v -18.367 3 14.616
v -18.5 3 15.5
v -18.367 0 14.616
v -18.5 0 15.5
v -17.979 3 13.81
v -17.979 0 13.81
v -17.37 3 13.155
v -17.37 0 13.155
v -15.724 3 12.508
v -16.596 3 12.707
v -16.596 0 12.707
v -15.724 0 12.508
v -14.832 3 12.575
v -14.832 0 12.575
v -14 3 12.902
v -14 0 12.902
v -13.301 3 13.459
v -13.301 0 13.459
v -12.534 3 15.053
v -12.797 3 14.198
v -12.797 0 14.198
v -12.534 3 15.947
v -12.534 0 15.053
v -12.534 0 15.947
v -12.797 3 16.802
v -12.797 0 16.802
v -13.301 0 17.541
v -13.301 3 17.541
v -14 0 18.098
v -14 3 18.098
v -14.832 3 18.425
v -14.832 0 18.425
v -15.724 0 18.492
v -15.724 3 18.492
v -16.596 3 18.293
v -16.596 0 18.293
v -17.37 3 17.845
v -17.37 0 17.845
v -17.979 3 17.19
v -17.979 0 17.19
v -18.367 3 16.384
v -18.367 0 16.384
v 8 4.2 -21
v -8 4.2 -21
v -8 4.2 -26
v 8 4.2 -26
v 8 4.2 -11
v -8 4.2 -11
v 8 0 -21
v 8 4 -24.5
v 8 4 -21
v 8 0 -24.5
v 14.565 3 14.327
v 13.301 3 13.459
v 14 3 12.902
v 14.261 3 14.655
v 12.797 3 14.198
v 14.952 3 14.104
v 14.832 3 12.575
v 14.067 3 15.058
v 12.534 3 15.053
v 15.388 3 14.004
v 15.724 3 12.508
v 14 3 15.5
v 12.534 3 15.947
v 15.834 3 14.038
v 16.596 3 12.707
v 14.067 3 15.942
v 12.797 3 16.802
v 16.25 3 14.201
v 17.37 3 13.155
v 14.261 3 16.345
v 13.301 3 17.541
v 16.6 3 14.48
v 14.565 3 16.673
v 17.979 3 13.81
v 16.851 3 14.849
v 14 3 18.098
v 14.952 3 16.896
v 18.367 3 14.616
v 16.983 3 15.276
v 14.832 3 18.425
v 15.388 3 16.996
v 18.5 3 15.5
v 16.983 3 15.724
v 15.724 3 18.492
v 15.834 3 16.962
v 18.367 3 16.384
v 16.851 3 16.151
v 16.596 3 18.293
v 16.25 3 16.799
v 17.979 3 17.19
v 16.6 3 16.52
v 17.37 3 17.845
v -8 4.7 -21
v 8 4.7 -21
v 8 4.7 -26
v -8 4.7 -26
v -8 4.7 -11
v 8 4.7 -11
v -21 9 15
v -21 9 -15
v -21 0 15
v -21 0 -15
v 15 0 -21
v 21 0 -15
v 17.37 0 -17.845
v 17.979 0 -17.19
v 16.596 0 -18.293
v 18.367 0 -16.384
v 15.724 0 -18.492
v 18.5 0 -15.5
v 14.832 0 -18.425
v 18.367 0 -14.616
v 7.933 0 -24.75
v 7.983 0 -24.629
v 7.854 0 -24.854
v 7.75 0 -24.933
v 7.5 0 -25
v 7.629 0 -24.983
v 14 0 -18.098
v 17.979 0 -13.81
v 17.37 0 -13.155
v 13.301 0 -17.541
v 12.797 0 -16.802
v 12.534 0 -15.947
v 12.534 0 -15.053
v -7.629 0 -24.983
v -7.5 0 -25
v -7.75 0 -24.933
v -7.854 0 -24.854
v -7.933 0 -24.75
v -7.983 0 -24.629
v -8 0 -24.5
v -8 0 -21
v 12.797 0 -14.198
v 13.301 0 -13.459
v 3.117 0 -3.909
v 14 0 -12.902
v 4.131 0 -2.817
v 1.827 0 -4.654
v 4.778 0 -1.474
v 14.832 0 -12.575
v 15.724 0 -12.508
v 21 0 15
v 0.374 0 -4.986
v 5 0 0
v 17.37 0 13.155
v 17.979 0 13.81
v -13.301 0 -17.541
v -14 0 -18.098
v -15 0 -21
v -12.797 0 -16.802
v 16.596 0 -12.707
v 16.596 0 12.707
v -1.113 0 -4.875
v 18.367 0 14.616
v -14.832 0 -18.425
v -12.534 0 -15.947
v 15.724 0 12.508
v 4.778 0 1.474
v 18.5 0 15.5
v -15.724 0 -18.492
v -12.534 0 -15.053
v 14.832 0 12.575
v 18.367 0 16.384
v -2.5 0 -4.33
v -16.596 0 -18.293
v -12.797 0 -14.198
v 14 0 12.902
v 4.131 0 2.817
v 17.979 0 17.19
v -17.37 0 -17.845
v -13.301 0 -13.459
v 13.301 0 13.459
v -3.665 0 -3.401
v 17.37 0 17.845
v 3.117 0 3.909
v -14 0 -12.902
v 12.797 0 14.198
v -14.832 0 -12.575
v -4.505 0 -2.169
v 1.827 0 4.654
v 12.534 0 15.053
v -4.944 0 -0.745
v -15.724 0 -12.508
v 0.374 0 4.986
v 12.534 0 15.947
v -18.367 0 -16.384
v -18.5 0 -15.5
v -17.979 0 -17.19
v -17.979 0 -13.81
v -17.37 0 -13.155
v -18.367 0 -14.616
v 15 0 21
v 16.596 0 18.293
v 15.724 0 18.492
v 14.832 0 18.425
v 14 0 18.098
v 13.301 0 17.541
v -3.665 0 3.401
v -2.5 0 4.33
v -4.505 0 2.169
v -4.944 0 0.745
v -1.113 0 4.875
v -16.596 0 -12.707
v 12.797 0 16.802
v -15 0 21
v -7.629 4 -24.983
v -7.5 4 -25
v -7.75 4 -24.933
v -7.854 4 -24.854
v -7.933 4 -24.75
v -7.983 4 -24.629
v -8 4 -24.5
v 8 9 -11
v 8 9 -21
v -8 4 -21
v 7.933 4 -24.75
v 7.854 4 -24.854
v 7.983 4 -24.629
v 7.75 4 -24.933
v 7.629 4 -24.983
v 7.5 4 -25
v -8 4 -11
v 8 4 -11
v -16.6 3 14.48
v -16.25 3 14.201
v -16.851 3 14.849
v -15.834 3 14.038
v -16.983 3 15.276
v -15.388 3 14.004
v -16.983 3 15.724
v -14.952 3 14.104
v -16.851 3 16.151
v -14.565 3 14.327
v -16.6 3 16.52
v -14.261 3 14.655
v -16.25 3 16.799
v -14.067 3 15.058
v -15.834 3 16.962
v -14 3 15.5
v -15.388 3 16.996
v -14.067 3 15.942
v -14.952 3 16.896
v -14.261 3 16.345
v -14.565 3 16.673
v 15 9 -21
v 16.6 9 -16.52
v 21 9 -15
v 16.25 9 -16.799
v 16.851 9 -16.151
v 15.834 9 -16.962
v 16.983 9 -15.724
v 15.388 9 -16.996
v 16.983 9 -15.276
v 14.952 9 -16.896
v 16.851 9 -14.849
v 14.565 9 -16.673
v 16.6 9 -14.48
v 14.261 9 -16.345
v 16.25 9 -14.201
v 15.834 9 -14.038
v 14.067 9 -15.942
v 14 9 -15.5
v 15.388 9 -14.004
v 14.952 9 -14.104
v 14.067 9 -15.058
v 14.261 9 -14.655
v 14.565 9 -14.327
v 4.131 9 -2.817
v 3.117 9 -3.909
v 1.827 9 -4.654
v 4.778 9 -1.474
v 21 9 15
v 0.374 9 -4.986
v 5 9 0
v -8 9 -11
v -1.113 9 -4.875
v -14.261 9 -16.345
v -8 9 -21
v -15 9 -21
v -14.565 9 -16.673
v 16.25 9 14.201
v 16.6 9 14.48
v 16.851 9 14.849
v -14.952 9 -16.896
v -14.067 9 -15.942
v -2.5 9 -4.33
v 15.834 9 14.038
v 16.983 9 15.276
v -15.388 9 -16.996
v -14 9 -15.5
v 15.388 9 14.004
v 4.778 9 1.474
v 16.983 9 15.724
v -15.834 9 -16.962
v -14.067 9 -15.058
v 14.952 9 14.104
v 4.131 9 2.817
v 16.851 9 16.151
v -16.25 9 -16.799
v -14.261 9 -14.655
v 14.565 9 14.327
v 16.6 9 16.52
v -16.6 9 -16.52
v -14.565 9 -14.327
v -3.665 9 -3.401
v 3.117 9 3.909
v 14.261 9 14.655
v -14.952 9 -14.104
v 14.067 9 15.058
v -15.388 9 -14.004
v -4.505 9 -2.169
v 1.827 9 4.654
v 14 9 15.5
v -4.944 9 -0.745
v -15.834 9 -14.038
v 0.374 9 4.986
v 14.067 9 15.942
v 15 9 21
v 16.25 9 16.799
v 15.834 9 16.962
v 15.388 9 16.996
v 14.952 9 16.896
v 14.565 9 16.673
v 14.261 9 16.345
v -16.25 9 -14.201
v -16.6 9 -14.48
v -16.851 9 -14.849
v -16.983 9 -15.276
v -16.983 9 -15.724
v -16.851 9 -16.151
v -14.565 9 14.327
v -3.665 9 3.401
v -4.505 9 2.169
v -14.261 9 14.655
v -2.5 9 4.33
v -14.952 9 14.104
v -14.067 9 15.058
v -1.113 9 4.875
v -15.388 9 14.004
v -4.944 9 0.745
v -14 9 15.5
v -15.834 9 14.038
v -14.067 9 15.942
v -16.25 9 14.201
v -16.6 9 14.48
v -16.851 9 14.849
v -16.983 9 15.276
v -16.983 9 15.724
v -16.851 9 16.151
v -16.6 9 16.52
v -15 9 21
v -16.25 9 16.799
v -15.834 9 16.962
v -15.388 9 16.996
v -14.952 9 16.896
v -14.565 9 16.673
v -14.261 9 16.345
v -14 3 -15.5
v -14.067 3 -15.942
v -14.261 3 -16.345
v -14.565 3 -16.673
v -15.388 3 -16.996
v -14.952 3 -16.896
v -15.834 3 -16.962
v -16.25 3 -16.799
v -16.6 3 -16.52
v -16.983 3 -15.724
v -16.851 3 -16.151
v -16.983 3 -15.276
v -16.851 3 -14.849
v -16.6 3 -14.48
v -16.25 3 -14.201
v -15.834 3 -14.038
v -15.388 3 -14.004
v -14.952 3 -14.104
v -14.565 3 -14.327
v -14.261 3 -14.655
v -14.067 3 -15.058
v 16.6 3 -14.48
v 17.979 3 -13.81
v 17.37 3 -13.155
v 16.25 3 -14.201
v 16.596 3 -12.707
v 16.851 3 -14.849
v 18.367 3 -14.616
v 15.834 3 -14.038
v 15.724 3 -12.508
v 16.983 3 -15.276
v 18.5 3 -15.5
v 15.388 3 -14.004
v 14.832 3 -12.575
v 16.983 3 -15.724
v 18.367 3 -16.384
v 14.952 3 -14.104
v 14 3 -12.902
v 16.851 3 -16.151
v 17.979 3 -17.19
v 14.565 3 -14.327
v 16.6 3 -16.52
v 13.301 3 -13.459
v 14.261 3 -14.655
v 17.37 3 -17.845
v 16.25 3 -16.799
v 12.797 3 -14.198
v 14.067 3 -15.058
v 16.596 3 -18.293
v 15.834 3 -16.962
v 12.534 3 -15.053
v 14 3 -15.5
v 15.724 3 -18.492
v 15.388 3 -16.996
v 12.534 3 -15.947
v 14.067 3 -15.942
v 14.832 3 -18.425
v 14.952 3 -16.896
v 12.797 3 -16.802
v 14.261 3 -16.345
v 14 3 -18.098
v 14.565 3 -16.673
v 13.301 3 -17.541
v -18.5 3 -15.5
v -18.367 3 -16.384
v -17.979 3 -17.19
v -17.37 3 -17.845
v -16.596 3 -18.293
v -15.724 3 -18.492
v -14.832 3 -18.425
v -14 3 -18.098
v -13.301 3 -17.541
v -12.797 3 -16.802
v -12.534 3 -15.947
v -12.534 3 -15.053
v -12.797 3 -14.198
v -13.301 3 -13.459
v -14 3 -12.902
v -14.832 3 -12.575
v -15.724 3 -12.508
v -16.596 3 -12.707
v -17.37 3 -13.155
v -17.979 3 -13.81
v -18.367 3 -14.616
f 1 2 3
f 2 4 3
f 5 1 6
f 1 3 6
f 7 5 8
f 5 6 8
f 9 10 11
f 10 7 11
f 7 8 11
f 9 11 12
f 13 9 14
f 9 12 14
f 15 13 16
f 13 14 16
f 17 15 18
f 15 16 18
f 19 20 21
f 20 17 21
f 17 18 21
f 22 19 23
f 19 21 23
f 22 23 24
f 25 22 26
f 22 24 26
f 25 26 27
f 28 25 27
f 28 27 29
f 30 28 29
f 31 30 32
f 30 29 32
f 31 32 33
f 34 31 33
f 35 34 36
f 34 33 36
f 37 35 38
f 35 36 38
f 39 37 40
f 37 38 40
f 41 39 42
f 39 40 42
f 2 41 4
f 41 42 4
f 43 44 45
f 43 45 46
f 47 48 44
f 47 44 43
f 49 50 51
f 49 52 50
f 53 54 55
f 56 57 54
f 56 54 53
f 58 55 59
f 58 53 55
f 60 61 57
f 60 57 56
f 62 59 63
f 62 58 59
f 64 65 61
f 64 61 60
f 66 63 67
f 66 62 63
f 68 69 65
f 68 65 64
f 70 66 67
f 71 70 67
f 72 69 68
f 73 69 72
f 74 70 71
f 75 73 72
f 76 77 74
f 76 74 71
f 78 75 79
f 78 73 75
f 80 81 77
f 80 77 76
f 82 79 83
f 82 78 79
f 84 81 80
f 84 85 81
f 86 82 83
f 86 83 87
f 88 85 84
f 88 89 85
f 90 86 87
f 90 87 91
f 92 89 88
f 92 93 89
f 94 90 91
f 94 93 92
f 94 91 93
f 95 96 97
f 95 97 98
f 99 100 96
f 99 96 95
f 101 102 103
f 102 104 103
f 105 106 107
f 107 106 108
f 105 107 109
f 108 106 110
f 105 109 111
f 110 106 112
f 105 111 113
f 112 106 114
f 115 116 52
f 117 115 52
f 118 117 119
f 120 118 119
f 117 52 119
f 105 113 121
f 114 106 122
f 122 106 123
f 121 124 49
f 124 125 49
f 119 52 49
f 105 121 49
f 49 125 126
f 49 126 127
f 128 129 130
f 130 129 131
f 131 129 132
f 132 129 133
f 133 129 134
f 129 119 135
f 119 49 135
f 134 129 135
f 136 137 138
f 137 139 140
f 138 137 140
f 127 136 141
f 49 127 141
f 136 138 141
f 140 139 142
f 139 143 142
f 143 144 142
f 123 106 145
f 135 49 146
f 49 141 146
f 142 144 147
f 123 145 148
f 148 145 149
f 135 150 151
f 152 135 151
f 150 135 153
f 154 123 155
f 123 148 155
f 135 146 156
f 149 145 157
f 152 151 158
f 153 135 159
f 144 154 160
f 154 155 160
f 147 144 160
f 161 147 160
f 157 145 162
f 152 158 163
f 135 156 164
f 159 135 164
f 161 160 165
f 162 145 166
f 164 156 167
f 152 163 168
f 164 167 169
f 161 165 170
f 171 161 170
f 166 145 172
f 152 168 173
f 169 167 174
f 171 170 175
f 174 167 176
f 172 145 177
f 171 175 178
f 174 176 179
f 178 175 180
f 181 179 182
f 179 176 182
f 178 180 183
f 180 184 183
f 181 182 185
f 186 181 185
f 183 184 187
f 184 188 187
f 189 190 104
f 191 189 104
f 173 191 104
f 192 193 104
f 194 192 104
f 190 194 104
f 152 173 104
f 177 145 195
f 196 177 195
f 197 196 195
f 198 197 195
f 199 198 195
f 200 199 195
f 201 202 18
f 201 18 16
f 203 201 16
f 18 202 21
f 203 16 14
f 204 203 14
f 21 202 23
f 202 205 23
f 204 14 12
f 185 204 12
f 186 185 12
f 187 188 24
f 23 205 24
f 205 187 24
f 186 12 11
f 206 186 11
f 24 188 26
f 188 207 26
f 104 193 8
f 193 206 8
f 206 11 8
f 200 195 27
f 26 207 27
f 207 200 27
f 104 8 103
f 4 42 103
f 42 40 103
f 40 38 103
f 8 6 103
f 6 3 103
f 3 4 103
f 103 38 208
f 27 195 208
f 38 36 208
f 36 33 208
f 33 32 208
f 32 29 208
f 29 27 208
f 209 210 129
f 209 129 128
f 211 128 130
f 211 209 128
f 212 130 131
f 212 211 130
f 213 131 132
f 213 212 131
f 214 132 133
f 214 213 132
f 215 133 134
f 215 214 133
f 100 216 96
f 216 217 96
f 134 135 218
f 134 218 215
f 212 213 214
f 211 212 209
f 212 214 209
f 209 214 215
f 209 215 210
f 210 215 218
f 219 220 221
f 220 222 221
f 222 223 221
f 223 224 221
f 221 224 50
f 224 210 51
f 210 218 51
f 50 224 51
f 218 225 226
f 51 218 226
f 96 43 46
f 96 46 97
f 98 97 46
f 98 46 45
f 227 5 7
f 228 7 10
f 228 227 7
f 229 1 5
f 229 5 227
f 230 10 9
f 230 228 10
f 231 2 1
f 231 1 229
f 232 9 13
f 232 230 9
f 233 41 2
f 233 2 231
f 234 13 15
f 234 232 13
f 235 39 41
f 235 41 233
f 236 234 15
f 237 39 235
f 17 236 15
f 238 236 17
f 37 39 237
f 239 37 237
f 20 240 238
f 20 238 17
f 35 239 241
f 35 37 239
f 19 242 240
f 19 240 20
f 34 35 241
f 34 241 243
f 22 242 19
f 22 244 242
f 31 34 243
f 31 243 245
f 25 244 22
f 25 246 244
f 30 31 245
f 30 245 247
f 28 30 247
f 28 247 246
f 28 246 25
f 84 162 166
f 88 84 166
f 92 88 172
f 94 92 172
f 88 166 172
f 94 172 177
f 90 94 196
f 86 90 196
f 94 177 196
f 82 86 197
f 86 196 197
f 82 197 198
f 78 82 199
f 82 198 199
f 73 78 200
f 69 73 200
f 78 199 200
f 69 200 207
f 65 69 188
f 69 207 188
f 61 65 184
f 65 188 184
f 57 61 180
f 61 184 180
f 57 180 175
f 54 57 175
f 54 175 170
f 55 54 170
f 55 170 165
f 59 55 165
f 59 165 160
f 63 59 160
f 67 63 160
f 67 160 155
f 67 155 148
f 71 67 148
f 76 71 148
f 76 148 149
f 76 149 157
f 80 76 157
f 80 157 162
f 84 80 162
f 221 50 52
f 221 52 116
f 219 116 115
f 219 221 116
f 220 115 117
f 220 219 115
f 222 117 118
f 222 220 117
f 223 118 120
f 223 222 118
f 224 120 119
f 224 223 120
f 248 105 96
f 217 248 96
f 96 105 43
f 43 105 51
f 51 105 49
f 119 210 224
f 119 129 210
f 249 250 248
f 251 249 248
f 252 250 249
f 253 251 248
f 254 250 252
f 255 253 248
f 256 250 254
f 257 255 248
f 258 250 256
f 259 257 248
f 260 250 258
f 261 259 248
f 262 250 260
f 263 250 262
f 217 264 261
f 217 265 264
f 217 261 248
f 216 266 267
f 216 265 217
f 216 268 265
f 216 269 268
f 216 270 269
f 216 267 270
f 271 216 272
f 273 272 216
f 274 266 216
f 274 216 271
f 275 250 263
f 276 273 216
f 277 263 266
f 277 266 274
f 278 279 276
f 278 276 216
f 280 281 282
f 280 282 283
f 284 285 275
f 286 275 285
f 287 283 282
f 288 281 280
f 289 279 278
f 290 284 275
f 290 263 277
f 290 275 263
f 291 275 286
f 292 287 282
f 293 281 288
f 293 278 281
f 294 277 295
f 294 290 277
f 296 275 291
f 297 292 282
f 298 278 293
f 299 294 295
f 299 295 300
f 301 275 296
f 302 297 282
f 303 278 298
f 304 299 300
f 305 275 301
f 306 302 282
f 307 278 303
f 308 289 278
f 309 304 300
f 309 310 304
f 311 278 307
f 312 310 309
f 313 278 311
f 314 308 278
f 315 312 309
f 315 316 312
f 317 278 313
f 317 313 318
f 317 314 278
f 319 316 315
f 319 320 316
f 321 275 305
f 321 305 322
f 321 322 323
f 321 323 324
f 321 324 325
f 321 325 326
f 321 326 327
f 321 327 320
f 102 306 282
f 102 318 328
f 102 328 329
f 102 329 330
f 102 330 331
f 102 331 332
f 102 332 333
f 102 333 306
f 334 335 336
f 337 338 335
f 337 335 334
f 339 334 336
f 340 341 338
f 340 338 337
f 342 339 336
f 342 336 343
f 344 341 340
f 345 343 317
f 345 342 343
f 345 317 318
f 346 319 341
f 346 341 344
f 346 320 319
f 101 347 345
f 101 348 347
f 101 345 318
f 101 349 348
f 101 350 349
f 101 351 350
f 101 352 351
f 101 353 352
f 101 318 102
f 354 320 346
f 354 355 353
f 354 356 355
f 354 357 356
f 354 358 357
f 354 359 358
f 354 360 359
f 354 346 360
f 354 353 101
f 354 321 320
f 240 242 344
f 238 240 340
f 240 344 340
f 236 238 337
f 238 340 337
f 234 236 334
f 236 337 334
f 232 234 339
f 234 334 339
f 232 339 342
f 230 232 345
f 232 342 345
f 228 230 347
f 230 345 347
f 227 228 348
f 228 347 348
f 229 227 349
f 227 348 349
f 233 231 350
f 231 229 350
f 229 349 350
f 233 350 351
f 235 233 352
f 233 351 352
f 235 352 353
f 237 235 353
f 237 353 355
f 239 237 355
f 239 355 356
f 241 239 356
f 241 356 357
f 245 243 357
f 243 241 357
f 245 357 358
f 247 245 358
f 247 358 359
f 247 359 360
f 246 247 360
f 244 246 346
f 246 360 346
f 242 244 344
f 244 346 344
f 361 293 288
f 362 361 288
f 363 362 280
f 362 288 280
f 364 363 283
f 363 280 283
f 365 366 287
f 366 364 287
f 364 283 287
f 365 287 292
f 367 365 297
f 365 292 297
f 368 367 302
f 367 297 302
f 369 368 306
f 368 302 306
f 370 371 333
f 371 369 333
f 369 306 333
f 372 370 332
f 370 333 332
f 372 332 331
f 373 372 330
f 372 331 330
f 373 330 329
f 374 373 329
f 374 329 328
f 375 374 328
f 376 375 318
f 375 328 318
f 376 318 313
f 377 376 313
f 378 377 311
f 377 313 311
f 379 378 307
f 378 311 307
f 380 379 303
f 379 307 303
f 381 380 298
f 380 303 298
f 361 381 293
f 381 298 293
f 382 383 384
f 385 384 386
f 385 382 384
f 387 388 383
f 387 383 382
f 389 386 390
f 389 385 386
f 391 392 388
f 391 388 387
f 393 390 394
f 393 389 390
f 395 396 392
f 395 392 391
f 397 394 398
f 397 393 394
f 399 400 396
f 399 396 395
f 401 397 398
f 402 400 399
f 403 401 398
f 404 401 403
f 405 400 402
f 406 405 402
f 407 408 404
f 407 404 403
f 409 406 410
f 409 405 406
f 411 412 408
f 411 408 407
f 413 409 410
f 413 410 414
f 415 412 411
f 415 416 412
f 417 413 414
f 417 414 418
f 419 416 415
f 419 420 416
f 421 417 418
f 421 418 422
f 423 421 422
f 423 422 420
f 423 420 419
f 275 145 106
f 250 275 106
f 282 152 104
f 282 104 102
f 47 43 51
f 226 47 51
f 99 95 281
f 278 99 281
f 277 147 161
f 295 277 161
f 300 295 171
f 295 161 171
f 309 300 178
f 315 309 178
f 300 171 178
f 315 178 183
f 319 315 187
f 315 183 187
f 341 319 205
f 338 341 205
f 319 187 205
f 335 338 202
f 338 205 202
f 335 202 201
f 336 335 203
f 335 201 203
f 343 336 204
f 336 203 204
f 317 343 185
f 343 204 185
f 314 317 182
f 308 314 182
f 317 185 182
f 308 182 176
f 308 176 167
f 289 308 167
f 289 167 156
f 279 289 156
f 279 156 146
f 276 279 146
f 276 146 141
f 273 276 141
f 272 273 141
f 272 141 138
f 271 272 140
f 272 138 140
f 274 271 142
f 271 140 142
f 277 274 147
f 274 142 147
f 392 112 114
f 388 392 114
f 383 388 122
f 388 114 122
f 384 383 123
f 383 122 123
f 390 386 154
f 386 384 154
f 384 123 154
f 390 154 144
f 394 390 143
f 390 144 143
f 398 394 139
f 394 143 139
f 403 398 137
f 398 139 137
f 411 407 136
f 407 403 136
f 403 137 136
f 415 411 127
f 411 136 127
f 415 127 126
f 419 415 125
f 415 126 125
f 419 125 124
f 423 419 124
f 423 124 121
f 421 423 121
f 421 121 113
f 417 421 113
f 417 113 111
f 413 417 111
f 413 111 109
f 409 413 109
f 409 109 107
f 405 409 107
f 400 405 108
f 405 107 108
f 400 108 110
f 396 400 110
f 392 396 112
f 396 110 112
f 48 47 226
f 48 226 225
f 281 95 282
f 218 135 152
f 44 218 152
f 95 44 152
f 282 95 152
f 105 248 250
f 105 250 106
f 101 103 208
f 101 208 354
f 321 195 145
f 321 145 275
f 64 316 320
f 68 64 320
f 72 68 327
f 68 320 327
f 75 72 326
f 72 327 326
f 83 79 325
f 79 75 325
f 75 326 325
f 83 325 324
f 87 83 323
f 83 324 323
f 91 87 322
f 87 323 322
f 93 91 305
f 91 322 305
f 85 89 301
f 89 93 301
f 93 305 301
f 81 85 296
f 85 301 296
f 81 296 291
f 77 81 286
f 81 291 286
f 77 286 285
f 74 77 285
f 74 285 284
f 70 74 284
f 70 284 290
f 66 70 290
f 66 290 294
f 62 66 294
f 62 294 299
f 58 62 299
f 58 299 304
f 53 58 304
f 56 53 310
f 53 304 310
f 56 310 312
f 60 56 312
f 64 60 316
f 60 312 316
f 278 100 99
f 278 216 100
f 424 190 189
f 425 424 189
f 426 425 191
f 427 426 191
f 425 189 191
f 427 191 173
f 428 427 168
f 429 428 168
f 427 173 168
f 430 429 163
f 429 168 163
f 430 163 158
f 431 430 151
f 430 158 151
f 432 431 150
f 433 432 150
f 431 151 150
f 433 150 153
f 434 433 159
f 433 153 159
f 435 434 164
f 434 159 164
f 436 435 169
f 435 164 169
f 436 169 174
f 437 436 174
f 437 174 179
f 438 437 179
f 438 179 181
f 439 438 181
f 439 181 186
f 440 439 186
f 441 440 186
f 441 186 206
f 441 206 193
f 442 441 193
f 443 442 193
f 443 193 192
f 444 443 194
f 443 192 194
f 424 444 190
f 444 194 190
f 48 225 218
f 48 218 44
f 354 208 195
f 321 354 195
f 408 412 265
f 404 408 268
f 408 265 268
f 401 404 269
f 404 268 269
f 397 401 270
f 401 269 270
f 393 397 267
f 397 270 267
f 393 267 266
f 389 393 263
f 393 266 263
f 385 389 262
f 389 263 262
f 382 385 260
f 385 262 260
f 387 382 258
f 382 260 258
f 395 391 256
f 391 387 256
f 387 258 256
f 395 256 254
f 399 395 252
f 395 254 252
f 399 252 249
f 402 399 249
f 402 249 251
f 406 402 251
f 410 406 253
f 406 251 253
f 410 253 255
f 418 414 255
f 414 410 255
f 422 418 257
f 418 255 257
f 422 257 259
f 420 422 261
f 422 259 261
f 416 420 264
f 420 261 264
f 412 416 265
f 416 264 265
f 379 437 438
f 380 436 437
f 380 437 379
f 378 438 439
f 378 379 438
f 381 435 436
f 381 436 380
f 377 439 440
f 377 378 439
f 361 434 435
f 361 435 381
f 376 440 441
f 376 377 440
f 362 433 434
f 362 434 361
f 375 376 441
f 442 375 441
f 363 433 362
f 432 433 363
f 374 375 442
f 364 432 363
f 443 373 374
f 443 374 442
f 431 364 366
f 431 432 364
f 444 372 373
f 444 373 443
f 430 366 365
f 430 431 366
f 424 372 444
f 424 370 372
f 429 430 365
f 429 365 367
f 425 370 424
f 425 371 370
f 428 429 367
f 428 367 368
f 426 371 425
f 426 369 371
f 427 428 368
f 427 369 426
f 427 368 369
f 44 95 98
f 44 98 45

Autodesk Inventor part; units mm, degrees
ref_plane "YZ Plane" through (0, 0, 0) normal (1, 0, 0) x (0, 1, 0)
ref_plane "XZ Plane" through (0, 0, 0) normal (0, 1, 0) x (-1, 0, 0)
ref_plane "XY Plane" through (0, 0, 0) normal (0, 0, 1) x (1, 0, 0)
sketch "Sketch1" plane through (0, 0, 0) normal (0, 1, 0) x (-1, 0, 0)
  line L0 (-21, -21) -> (21, -21)
  line L1 (21, -21) -> (21, 21)
  line L2 (21, 21) -> (-21, 21)
  line L3 (-21, 21) -> (-21, -21)
  line L4 (-21, -21) -> (21, 21) construction
  line L5 (21, -21) -> (-21, 21) construction
  point P0 (0, 0)
  dimension "d0" = 42
  dimension "d1" = 42
extrude "Extrusion1" add sketch "Sketch1" along normal blind 9
chamfer "Chamfer1" distance 6 angle 45 4 edges at (21, 4.5, -21) (-21, 4.5, -21) (-21, 4.5, 21) (21, 4.5, 21)
sketch "Sketch2" plane through (0, 9, 0) normal (0, 1, 0) x (1, 0, 0)
  point P0 (0, 0)
sketch "Sketch3" plane through (0, 0, 0) normal (0, -1, 0) x (1, 0, 0)
  circle A0 centre (0, 0) radius 5
  dimension "d7" = 10
extrude "Extrusion2" cut sketch "Sketch3" against normal up to surface (9 mm away)
sketch "Sketch4" plane through (0, 9, 0) normal (0, 1, 0) x (1, 0, 0)
  circle A0 centre (-15.5, -15.5) radius 1.5
  line L0 (-15, -21) -> (15, -21) projected
  line L1 (-21, 15) -> (-21, -15) projected
  point P0 (0, 0)
  dimension "d10" = 3
  dimension "d11" = 5.5
  dimension "d12" = 5.5
extrude "Extrusion3" cut sketch "Sketch4" against normal up to surface (9 mm away)
mirror "Mirror1" about plane through (0, 0, 0) normal (1, 0, 0) of "Extrusion3"
mirror "Mirror2" about plane through (0, 0, 0) normal (0, 0, 1) of "Extrusion3", "Mirror1"
sketch "Sketch6" plane through (0, 0, 0) normal (0, -1, 0) x (1, 0, 0)
  circle A0 centre (15.5, -15.5) radius 1.5 projected
  circle A1 centre (-15.5, -15.5) radius 1.5 projected
  circle A2 centre (15.5, 15.5) radius 1.5 projected
  circle A3 centre (-15.5, 15.5) radius 1.5 projected
  circle A4 centre (0, 0) radius 5 projected
  line L0 (15, 21) -> (21, 15) projected
  line L1 (-15, 21) -> (15, 21) projected
  line L2 (-21, 15) -> (-15, 21) projected
  line L3 (-21, -15) -> (-21, 15) projected
  line L4 (-15, -21) -> (-21, -15) projected
  line L5 (15, -21) -> (-15, -21) projected
  line L6 (21, -15) -> (15, -21) projected
  line L7 (21, 15) -> (21, -15) projected
  line L8 (8, -21) -> (-8, -21)
  line L9 (-8, -21) -> (-8, -25)
  line L10 (-8, -25) -> (8, -25)
  line L11 (8, -25) -> (8, -21)
  dimension "d20" = 16
  dimension "d21" = 8
  dimension "d24" = 4
extrude "Extrusion5" add sketch "Sketch6" against normal blind 4 contours L11 L10 L9 L5
fillet "Fillet1" radius 0.5 2 edges at (8, 2, -25) (-8, 2, -25)
sketch "Sketch7" plane through (15, 9, -21) normal (0, 0, -1) x (-1, 0, 0)
  line L0 (23, -5) -> (23, -9) projected
  line L1 (23, -9) -> (30, -9) projected
  line L2 (30, 0) -> (30, -9) projected
  line L3 (0, 0) -> (30, 0) projected
  line L4 (0, -9) -> (0, 0) projected
  line L5 (0, -9) -> (7, -9) projected
  line L6 (7, -9) -> (7, -5) projected
  line L7 (7, -5) -> (23, -5) projected
  line L8 (7, -5) -> (23, -5)
  line L9 (23, -5) -> (23, 0)
  line L10 (23, 0) -> (7, 0)
  line L11 (7, 0) -> (7, -5)
  point P0 (15, -9)
extrude "Extrusion6" cut sketch "Sketch7" against normal blind 10 contours L7 L11 L3 L9
sketch "Sketch8" plane through (15, 9, -11) normal (0, 0, -1) x (-1, 0, 0)
  line L0 (23, -5) -> (7, -5) projected
  line L1 (23, 0) -> (23, -5) projected
  line L2 (7, 0) -> (23, 0) projected
  line L3 (7, -5) -> (7, 0) projected
  line L4 (23, 0) -> (23, -5) projected
  line L5 (7, -4.3) -> (23, -4.3)
  line L6 (23, -4.3) -> (23, -4.8)
  line L7 (23, -4.8) -> (7, -4.8)
  line L8 (7, -4.8) -> (7, -4.3)
  point P0 (15, -9)
  dimension "d28" = 0.5
  dimension "d29" = 0.2
extrude "Extrusion7" add sketch "Sketch8" along normal blind 15 contours L7 L3 L5 L1
sketch "Sketch9" plane through (15, 9, -11) normal (0, 0, -1) x (-1, 0, 0)
  point P0 (15, -9)
sketch "Sketch10" plane through (0, 0, 0) normal (0, -1, 0) x (1, 0, 0)
  circle A0 centre (15.5, 15.5) radius 1.5 projected
  circle A1 centre (15.5, 15.5) radius 3
  point P0 (0, 0)
  dimension "d32" = 6
extrude "Extrusion8" cut sketch "Sketch10" against normal blind 3
mirror "Mirror3" about plane through (0, 0, 0) normal (1, 0, 0) of "Extrusion8"
mirror "Mirror4" about plane through (0, 0, 0) normal (0, 0, 1) of "Extrusion8", "Mirror3"
equation "\"d12\" = d11"
equation "\"d21\" = 0.5 * d20"
